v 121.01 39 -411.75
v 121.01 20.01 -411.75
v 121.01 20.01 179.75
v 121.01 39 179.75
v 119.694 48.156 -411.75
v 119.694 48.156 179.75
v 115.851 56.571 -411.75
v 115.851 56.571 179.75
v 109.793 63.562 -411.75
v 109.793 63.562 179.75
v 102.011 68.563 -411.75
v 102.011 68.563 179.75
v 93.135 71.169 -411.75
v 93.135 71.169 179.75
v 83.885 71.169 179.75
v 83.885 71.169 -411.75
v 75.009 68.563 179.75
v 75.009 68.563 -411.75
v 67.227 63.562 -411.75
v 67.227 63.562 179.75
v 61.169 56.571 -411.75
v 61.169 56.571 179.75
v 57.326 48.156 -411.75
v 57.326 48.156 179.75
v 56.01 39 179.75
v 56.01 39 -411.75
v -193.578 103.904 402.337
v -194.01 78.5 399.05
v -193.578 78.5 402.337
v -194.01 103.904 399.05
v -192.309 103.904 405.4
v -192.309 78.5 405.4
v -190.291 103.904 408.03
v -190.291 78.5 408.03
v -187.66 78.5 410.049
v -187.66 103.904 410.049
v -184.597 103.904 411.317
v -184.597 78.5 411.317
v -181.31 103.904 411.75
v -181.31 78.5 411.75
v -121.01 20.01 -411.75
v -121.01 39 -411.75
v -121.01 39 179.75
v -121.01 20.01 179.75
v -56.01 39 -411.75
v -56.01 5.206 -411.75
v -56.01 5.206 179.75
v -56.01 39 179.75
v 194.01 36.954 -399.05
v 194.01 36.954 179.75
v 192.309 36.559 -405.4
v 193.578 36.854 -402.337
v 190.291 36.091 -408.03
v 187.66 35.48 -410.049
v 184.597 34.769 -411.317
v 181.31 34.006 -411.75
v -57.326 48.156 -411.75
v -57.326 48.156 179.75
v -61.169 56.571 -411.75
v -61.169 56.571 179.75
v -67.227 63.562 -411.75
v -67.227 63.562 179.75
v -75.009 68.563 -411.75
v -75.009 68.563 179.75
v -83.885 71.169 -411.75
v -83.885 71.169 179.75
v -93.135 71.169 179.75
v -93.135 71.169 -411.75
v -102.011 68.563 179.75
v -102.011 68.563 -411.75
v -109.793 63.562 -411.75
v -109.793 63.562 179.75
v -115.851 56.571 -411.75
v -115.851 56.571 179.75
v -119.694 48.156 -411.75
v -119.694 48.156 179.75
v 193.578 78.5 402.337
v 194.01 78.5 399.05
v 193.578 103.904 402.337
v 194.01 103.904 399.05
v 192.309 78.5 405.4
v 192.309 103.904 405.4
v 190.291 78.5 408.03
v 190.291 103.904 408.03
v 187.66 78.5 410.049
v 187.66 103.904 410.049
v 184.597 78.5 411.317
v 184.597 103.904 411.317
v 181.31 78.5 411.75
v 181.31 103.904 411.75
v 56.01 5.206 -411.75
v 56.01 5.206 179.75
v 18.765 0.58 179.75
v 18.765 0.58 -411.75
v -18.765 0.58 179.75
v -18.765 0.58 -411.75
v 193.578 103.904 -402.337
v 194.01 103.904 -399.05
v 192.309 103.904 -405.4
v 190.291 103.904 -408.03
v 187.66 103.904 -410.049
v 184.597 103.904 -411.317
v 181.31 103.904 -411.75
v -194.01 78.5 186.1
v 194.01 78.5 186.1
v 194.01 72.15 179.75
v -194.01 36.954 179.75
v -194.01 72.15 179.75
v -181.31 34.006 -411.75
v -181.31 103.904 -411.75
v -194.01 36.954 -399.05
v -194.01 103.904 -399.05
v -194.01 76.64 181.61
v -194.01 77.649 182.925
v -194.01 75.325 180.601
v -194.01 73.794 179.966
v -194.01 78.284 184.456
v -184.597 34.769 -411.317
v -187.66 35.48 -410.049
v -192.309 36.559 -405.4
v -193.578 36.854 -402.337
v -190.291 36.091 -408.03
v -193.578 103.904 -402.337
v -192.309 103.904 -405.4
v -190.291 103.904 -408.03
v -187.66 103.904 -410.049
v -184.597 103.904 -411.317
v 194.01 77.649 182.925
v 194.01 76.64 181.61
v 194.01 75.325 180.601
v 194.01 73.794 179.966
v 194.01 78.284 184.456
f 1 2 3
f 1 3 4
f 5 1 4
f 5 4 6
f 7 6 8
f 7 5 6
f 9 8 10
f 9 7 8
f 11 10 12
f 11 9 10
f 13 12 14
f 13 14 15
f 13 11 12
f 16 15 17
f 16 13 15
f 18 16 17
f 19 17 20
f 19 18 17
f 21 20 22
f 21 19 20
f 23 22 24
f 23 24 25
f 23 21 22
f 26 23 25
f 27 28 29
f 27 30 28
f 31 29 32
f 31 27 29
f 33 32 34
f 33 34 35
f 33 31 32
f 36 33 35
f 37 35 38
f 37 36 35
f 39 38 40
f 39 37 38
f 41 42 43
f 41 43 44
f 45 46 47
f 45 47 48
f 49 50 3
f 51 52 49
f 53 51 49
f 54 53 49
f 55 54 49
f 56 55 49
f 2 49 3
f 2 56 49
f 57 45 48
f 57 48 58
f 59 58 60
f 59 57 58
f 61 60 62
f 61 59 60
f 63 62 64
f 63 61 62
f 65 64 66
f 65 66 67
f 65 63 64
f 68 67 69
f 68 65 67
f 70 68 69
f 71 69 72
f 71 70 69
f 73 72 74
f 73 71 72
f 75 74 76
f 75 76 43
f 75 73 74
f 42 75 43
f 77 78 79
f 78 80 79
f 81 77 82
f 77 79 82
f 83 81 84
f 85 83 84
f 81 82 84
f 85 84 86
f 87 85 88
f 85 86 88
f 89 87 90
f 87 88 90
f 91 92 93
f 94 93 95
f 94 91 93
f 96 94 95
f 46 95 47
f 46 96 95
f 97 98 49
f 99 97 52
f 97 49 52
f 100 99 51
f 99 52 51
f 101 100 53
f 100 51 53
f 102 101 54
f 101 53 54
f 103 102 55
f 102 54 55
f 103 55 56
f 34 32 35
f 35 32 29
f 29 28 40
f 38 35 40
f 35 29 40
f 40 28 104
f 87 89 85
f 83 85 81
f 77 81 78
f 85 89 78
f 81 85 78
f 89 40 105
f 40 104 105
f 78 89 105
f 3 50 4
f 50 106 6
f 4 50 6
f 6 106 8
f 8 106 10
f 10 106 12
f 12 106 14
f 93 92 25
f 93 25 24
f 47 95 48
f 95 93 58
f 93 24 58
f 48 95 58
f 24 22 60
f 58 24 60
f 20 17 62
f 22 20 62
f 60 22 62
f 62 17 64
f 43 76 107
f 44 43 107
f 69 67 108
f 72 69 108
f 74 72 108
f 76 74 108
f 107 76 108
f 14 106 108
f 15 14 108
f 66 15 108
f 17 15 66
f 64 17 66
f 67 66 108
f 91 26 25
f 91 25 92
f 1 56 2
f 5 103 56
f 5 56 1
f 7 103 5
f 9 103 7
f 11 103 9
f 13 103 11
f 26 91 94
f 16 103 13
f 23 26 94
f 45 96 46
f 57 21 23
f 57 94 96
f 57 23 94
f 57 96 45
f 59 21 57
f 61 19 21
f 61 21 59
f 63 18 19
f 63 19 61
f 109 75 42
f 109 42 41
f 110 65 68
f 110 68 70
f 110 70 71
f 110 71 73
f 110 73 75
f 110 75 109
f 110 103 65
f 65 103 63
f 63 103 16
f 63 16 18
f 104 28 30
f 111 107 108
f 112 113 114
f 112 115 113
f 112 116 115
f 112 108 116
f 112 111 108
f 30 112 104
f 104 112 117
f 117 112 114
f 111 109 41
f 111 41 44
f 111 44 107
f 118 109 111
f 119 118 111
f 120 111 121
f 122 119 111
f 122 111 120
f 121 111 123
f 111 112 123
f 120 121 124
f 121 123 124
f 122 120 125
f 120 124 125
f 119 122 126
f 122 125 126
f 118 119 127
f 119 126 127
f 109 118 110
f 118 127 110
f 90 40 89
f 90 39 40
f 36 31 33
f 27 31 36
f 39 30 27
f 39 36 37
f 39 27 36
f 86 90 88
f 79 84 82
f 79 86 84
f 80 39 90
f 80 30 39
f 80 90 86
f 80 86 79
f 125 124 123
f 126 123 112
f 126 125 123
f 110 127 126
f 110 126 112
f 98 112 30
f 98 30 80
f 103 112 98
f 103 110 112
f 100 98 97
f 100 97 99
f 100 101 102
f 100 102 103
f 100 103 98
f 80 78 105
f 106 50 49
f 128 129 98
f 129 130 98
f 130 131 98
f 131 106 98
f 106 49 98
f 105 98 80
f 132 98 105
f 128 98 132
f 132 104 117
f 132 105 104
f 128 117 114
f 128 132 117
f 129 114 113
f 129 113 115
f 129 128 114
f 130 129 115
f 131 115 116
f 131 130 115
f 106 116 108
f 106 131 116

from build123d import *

# Parameters (mm, degrees)
BOSS_EXTRUDE1_DEPTH = 591.5
SKETCH2_W           = 388.02090207
SKETCH2_H           = 25.404192512
BOSS_EXTRUDE2_DEPTH = 232
FILLET1_R           = 12.7
FILLET3_R           = 6.35


with BuildPart() as part:
    # Sketch1 → Boss-Extrude1 (new body)
    with BuildSketch(Plane(origin=(0, 0, -411.75), x_dir=(-1, 0, 0), z_dir=(0, 0, -1))):
        with BuildLine():
            Line((121.01, 20.009665474), (194.010451035, 36.954192512))
            Line((194.010451035, 36.954192512), (194.010451035, 103.904192512))
            Line((194.010451035, 103.904192512), (-194.010451035, 103.904192512))
            Line((-194.010451035, 103.904192512), (-194.010451035, 36.954192512))
            Line((-194.010451035, 36.954192512), (-121.01, 20.009665474))
            Line((-121.01, 20.009665474), (-121.01, 39))
            ThreePointArc((-121.01, 39), (-88.51, 71.5), (-56.01, 39))
            Line((-56.01, 39), (-56.01, 5.206473282))
            ThreePointArc((-56.01, 5.206473282), (0, 0), (56.01, 5.206473282))
            Line((56.01, 5.206473282), (56.01, 39))
            ThreePointArc((56.01, 39), (88.51, 71.5), (121.01, 39))
            Line((121.01, 39), (121.01, 20.009665474))
        make_face()
    extrude(amount=-BOSS_EXTRUDE1_DEPTH)

    # Sketch2 → Boss-Extrude2 (add)
    with BuildSketch(Plane.XY.offset(179.75)):
        with Locations((0, 91.202096256)):
            Rectangle(SKETCH2_W, SKETCH2_H)
    extrude(amount=BOSS_EXTRUDE2_DEPTH)

    # Fillet1
    fillet1_edges = [part.edges().sort_by_distance(p)[0] for p in [
        (194.010451035, 70.429192512, -411.75),
        (-194.010451035, 70.429192512, -411.75),
        (194.010451035, 91.202096256, 411.75),
        (-194.010451035, 91.202096256, 411.75),
    ]]
    fillet(fillet1_edges, radius=FILLET1_R)

    # Fillet3
    fillet3_edges = [part.edges().sort_by_distance(p)[0] for p in [
        (0, 78.5, 179.75),
    ]]
    fillet(fillet3_edges, radius=FILLET3_R)


solid = part.part
